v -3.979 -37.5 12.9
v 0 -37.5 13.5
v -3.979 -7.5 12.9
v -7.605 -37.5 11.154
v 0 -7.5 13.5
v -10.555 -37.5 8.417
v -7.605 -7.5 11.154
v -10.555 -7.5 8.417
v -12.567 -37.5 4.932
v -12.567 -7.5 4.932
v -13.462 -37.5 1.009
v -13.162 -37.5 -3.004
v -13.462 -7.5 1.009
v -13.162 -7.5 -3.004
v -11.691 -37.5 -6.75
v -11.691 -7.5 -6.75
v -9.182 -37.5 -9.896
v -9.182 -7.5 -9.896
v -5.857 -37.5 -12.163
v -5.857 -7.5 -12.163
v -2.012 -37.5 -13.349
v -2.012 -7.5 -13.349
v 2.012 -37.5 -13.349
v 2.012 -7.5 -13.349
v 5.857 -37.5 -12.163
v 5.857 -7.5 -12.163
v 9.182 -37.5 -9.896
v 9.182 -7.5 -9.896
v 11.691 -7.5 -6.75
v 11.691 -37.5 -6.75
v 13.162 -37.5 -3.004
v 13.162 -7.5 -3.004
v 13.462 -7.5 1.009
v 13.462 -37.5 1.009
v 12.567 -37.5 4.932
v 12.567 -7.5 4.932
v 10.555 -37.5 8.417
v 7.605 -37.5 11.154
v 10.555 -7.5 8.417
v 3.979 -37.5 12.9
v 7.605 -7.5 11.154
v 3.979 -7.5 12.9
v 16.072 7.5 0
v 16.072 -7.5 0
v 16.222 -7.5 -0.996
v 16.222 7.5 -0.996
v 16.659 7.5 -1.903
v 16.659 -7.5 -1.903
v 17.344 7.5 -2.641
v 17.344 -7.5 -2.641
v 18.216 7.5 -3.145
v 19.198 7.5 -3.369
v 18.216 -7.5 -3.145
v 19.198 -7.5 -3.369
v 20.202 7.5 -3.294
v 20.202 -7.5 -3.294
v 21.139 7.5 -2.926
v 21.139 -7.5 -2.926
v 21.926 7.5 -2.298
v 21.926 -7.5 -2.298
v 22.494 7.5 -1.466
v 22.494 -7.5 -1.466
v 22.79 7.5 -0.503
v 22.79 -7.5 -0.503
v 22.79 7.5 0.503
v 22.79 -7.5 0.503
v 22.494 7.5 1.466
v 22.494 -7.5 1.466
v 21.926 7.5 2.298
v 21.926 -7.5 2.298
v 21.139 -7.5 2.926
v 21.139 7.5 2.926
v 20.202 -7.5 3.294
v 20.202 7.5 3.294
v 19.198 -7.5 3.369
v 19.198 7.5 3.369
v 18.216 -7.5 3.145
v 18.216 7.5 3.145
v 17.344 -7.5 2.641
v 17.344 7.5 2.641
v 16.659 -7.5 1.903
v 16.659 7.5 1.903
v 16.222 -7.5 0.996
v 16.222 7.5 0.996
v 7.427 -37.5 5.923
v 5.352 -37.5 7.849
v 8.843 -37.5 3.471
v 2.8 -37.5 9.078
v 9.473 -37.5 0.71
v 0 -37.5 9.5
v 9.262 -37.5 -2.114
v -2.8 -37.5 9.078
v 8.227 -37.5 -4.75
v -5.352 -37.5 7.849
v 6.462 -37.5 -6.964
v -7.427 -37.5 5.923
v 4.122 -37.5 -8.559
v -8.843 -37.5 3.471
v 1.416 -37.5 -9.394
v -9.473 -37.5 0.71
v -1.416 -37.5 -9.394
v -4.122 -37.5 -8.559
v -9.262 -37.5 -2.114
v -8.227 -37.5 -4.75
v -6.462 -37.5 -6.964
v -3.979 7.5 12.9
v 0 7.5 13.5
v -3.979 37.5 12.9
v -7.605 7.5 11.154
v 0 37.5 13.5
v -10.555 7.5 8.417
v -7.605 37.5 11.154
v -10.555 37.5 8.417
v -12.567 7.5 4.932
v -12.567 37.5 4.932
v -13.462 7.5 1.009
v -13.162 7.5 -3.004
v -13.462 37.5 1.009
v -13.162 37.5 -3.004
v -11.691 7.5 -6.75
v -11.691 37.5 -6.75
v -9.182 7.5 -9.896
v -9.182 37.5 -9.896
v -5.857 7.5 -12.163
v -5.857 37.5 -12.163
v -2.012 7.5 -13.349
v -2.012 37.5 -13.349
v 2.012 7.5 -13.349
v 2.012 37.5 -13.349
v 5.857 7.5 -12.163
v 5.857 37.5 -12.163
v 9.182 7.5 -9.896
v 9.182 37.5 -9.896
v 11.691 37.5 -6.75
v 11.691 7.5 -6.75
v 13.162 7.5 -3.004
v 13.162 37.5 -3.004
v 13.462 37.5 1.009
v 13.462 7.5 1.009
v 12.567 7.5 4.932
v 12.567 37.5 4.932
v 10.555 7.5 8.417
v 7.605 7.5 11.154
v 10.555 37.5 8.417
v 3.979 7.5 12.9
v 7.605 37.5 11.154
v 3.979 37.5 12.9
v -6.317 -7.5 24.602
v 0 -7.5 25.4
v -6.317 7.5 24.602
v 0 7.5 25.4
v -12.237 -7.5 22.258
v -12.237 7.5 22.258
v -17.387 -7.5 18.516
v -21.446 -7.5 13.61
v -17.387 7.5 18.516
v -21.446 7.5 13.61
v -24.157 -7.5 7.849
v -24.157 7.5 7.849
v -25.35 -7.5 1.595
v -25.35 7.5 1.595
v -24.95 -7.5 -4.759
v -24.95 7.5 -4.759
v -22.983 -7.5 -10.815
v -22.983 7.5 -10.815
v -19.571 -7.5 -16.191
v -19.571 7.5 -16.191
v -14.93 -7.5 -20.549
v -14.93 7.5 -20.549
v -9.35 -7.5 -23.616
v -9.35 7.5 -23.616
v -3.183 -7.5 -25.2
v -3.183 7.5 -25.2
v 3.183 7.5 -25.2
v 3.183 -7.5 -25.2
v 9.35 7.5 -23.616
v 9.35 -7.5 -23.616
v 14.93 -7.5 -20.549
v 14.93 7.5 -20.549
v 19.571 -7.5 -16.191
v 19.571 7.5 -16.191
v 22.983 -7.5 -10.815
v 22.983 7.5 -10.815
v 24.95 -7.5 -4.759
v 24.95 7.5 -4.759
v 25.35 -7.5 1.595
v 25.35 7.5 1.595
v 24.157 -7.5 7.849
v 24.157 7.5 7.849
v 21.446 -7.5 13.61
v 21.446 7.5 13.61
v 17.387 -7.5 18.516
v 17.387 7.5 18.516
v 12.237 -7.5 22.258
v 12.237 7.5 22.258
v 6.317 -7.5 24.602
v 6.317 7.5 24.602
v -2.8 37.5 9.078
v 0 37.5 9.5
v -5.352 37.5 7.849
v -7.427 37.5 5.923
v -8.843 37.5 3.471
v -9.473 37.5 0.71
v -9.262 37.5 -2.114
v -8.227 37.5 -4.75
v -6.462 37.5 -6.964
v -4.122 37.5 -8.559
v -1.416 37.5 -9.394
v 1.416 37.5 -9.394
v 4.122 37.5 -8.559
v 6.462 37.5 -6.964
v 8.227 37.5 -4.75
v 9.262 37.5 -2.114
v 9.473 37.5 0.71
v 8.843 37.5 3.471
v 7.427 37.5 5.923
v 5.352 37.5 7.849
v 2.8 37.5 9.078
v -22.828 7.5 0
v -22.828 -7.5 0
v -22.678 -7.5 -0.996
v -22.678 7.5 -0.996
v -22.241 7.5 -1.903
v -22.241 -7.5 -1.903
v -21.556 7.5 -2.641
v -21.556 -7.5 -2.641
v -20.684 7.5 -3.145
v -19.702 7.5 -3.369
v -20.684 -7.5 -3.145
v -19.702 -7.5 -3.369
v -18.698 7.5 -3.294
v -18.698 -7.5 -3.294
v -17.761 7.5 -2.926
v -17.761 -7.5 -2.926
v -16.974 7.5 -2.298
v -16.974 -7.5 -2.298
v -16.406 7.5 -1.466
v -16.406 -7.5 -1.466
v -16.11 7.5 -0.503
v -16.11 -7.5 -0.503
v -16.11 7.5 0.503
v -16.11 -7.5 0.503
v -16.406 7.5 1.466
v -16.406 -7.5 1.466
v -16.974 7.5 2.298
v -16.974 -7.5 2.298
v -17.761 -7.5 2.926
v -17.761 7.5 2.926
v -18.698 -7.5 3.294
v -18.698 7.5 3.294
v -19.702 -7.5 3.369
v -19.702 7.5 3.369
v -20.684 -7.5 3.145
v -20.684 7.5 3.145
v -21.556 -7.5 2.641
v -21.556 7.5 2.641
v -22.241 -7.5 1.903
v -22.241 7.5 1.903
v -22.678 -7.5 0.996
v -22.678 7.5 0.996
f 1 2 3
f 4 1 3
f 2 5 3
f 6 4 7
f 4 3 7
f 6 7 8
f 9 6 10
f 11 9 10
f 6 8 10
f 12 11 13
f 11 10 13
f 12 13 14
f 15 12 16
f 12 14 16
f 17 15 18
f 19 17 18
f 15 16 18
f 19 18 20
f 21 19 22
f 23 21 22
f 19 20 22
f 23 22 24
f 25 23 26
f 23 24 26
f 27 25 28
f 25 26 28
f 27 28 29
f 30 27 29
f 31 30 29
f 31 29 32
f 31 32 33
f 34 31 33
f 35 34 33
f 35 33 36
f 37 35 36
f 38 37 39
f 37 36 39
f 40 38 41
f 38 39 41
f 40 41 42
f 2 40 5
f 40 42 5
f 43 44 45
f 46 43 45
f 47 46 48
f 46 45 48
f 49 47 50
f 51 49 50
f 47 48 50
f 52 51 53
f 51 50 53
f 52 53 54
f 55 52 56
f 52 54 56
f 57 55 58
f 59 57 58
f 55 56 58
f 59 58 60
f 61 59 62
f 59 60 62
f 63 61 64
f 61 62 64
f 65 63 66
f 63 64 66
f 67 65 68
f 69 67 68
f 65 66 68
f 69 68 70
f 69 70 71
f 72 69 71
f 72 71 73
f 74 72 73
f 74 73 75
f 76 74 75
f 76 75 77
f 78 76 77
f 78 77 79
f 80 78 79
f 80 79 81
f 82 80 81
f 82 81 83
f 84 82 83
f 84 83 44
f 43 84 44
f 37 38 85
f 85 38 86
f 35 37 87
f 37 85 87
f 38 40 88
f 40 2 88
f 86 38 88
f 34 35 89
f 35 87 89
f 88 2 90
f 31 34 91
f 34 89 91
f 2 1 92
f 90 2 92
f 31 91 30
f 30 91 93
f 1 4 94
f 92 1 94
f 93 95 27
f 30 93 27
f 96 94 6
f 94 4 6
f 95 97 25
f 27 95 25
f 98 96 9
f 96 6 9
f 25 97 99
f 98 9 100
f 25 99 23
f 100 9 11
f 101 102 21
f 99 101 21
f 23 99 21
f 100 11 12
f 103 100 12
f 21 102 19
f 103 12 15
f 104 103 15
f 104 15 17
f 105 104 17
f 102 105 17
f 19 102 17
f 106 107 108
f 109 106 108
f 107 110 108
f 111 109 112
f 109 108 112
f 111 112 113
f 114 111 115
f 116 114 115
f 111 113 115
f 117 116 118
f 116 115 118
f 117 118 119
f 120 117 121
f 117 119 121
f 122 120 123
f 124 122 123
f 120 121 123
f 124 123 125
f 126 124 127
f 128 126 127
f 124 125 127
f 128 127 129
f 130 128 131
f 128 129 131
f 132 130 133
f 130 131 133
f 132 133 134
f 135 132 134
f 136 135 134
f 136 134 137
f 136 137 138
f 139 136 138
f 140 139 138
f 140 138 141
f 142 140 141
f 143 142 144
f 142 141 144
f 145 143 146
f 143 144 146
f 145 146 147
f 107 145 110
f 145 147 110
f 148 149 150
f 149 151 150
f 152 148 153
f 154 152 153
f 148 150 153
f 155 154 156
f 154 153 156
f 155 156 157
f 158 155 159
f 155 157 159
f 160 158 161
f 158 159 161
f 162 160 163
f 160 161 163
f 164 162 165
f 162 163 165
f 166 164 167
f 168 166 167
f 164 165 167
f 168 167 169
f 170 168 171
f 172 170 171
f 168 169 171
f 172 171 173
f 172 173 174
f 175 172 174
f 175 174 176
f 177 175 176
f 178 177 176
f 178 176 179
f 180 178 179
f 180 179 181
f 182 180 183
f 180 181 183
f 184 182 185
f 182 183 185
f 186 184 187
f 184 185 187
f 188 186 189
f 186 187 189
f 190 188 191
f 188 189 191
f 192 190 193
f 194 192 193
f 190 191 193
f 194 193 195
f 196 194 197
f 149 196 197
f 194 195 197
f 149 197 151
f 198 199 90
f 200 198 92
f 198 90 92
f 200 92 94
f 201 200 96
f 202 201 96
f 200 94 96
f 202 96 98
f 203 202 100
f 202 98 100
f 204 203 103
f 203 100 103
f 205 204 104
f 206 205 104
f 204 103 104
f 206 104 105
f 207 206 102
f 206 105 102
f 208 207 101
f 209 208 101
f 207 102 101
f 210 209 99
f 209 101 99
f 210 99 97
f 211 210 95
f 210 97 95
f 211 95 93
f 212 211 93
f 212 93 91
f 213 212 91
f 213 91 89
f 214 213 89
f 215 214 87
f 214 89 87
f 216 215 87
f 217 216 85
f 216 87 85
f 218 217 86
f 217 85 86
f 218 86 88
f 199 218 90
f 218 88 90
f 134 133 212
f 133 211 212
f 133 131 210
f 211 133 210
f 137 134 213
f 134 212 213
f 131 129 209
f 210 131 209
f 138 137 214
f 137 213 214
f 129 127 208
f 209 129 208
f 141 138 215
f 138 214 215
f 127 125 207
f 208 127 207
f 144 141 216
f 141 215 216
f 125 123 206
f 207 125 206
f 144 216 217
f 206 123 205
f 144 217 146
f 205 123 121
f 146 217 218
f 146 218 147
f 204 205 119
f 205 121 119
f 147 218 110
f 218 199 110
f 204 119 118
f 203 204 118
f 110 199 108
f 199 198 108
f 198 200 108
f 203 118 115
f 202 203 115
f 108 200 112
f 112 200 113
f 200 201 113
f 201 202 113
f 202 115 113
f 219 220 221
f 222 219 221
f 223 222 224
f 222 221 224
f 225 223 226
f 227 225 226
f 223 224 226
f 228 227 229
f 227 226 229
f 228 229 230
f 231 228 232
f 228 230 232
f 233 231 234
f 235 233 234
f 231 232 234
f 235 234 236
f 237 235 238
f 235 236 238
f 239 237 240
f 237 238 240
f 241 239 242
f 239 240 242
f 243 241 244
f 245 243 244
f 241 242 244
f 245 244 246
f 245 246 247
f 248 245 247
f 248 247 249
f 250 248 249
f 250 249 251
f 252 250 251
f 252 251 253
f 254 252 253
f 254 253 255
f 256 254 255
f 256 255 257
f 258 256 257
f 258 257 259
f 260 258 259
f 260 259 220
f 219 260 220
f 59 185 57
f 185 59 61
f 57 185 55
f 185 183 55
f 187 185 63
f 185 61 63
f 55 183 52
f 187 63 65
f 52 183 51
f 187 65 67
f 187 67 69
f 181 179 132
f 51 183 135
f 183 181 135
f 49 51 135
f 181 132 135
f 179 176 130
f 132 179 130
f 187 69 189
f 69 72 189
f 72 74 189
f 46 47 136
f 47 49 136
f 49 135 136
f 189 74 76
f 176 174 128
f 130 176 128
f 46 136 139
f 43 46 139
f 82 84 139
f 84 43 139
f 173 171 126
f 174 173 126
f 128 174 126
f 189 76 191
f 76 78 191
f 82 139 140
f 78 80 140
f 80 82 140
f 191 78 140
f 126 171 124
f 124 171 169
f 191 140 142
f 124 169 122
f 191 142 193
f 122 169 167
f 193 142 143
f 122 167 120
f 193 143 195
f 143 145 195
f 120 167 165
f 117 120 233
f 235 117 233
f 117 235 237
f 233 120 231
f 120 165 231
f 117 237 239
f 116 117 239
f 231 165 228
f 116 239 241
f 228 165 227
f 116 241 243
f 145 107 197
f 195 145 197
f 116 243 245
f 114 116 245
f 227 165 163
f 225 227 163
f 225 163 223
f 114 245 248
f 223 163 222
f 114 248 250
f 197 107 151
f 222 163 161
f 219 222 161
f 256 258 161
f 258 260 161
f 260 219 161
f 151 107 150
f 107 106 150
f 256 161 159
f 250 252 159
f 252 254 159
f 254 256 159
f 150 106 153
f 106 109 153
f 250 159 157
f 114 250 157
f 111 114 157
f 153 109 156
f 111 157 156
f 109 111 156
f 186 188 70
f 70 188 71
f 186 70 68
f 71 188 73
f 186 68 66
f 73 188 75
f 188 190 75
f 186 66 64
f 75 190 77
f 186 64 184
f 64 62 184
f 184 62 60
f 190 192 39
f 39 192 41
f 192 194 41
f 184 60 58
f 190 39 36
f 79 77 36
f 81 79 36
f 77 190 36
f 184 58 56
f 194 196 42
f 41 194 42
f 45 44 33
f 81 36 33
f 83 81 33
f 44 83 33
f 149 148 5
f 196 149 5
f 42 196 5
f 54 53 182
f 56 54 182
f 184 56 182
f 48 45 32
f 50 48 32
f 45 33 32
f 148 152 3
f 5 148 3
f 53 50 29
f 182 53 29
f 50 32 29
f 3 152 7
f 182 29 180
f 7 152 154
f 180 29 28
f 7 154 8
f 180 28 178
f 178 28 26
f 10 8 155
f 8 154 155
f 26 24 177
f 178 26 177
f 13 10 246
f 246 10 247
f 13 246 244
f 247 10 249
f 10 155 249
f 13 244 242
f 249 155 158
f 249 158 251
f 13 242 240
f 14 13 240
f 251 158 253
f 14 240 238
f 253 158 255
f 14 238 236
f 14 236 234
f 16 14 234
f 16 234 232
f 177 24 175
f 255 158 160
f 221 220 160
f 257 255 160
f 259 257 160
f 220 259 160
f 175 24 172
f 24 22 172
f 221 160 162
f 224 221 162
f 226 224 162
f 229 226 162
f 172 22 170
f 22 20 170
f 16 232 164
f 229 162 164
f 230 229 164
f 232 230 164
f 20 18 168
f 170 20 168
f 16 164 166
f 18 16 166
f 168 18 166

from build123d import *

# Parameters (mm, degrees)
TALADRO_DE_MARGEN_PARA_1_41_D = 6.7564


with BuildPart() as part:
    # Croquis2 → Revolución1 (revolve)
    with BuildSketch(Plane.XY, mode=Mode.PRIVATE) as revoluci_n1_sk:
        Polygon((9.5, 37.5), (9.5, -37.5), (13.5, -37.5), (13.5, -7.5), (25.4, -7.5), (25.4, 7.5), (13.5, 7.5), (13.5, 37.5), align=None)
    revolve(revoluci_n1_sk.sketch.rotate(Axis((0, 0, 0), (0, -1, 0)), 90), axis=Axis((0, 0, 0), (0, -1, 0)))

    # Taladro de margen para 1/41 (through all)
    with Locations(Plane(origin=(0, 7.5, 0), x_dir=(1, 0, 0), z_dir=(0, 1, 0))):
        with Locations((19.45, 0), (-19.45, 0)):
            Hole(TALADRO_DE_MARGEN_PARA_1_41_D / 2)


solid = part.part
